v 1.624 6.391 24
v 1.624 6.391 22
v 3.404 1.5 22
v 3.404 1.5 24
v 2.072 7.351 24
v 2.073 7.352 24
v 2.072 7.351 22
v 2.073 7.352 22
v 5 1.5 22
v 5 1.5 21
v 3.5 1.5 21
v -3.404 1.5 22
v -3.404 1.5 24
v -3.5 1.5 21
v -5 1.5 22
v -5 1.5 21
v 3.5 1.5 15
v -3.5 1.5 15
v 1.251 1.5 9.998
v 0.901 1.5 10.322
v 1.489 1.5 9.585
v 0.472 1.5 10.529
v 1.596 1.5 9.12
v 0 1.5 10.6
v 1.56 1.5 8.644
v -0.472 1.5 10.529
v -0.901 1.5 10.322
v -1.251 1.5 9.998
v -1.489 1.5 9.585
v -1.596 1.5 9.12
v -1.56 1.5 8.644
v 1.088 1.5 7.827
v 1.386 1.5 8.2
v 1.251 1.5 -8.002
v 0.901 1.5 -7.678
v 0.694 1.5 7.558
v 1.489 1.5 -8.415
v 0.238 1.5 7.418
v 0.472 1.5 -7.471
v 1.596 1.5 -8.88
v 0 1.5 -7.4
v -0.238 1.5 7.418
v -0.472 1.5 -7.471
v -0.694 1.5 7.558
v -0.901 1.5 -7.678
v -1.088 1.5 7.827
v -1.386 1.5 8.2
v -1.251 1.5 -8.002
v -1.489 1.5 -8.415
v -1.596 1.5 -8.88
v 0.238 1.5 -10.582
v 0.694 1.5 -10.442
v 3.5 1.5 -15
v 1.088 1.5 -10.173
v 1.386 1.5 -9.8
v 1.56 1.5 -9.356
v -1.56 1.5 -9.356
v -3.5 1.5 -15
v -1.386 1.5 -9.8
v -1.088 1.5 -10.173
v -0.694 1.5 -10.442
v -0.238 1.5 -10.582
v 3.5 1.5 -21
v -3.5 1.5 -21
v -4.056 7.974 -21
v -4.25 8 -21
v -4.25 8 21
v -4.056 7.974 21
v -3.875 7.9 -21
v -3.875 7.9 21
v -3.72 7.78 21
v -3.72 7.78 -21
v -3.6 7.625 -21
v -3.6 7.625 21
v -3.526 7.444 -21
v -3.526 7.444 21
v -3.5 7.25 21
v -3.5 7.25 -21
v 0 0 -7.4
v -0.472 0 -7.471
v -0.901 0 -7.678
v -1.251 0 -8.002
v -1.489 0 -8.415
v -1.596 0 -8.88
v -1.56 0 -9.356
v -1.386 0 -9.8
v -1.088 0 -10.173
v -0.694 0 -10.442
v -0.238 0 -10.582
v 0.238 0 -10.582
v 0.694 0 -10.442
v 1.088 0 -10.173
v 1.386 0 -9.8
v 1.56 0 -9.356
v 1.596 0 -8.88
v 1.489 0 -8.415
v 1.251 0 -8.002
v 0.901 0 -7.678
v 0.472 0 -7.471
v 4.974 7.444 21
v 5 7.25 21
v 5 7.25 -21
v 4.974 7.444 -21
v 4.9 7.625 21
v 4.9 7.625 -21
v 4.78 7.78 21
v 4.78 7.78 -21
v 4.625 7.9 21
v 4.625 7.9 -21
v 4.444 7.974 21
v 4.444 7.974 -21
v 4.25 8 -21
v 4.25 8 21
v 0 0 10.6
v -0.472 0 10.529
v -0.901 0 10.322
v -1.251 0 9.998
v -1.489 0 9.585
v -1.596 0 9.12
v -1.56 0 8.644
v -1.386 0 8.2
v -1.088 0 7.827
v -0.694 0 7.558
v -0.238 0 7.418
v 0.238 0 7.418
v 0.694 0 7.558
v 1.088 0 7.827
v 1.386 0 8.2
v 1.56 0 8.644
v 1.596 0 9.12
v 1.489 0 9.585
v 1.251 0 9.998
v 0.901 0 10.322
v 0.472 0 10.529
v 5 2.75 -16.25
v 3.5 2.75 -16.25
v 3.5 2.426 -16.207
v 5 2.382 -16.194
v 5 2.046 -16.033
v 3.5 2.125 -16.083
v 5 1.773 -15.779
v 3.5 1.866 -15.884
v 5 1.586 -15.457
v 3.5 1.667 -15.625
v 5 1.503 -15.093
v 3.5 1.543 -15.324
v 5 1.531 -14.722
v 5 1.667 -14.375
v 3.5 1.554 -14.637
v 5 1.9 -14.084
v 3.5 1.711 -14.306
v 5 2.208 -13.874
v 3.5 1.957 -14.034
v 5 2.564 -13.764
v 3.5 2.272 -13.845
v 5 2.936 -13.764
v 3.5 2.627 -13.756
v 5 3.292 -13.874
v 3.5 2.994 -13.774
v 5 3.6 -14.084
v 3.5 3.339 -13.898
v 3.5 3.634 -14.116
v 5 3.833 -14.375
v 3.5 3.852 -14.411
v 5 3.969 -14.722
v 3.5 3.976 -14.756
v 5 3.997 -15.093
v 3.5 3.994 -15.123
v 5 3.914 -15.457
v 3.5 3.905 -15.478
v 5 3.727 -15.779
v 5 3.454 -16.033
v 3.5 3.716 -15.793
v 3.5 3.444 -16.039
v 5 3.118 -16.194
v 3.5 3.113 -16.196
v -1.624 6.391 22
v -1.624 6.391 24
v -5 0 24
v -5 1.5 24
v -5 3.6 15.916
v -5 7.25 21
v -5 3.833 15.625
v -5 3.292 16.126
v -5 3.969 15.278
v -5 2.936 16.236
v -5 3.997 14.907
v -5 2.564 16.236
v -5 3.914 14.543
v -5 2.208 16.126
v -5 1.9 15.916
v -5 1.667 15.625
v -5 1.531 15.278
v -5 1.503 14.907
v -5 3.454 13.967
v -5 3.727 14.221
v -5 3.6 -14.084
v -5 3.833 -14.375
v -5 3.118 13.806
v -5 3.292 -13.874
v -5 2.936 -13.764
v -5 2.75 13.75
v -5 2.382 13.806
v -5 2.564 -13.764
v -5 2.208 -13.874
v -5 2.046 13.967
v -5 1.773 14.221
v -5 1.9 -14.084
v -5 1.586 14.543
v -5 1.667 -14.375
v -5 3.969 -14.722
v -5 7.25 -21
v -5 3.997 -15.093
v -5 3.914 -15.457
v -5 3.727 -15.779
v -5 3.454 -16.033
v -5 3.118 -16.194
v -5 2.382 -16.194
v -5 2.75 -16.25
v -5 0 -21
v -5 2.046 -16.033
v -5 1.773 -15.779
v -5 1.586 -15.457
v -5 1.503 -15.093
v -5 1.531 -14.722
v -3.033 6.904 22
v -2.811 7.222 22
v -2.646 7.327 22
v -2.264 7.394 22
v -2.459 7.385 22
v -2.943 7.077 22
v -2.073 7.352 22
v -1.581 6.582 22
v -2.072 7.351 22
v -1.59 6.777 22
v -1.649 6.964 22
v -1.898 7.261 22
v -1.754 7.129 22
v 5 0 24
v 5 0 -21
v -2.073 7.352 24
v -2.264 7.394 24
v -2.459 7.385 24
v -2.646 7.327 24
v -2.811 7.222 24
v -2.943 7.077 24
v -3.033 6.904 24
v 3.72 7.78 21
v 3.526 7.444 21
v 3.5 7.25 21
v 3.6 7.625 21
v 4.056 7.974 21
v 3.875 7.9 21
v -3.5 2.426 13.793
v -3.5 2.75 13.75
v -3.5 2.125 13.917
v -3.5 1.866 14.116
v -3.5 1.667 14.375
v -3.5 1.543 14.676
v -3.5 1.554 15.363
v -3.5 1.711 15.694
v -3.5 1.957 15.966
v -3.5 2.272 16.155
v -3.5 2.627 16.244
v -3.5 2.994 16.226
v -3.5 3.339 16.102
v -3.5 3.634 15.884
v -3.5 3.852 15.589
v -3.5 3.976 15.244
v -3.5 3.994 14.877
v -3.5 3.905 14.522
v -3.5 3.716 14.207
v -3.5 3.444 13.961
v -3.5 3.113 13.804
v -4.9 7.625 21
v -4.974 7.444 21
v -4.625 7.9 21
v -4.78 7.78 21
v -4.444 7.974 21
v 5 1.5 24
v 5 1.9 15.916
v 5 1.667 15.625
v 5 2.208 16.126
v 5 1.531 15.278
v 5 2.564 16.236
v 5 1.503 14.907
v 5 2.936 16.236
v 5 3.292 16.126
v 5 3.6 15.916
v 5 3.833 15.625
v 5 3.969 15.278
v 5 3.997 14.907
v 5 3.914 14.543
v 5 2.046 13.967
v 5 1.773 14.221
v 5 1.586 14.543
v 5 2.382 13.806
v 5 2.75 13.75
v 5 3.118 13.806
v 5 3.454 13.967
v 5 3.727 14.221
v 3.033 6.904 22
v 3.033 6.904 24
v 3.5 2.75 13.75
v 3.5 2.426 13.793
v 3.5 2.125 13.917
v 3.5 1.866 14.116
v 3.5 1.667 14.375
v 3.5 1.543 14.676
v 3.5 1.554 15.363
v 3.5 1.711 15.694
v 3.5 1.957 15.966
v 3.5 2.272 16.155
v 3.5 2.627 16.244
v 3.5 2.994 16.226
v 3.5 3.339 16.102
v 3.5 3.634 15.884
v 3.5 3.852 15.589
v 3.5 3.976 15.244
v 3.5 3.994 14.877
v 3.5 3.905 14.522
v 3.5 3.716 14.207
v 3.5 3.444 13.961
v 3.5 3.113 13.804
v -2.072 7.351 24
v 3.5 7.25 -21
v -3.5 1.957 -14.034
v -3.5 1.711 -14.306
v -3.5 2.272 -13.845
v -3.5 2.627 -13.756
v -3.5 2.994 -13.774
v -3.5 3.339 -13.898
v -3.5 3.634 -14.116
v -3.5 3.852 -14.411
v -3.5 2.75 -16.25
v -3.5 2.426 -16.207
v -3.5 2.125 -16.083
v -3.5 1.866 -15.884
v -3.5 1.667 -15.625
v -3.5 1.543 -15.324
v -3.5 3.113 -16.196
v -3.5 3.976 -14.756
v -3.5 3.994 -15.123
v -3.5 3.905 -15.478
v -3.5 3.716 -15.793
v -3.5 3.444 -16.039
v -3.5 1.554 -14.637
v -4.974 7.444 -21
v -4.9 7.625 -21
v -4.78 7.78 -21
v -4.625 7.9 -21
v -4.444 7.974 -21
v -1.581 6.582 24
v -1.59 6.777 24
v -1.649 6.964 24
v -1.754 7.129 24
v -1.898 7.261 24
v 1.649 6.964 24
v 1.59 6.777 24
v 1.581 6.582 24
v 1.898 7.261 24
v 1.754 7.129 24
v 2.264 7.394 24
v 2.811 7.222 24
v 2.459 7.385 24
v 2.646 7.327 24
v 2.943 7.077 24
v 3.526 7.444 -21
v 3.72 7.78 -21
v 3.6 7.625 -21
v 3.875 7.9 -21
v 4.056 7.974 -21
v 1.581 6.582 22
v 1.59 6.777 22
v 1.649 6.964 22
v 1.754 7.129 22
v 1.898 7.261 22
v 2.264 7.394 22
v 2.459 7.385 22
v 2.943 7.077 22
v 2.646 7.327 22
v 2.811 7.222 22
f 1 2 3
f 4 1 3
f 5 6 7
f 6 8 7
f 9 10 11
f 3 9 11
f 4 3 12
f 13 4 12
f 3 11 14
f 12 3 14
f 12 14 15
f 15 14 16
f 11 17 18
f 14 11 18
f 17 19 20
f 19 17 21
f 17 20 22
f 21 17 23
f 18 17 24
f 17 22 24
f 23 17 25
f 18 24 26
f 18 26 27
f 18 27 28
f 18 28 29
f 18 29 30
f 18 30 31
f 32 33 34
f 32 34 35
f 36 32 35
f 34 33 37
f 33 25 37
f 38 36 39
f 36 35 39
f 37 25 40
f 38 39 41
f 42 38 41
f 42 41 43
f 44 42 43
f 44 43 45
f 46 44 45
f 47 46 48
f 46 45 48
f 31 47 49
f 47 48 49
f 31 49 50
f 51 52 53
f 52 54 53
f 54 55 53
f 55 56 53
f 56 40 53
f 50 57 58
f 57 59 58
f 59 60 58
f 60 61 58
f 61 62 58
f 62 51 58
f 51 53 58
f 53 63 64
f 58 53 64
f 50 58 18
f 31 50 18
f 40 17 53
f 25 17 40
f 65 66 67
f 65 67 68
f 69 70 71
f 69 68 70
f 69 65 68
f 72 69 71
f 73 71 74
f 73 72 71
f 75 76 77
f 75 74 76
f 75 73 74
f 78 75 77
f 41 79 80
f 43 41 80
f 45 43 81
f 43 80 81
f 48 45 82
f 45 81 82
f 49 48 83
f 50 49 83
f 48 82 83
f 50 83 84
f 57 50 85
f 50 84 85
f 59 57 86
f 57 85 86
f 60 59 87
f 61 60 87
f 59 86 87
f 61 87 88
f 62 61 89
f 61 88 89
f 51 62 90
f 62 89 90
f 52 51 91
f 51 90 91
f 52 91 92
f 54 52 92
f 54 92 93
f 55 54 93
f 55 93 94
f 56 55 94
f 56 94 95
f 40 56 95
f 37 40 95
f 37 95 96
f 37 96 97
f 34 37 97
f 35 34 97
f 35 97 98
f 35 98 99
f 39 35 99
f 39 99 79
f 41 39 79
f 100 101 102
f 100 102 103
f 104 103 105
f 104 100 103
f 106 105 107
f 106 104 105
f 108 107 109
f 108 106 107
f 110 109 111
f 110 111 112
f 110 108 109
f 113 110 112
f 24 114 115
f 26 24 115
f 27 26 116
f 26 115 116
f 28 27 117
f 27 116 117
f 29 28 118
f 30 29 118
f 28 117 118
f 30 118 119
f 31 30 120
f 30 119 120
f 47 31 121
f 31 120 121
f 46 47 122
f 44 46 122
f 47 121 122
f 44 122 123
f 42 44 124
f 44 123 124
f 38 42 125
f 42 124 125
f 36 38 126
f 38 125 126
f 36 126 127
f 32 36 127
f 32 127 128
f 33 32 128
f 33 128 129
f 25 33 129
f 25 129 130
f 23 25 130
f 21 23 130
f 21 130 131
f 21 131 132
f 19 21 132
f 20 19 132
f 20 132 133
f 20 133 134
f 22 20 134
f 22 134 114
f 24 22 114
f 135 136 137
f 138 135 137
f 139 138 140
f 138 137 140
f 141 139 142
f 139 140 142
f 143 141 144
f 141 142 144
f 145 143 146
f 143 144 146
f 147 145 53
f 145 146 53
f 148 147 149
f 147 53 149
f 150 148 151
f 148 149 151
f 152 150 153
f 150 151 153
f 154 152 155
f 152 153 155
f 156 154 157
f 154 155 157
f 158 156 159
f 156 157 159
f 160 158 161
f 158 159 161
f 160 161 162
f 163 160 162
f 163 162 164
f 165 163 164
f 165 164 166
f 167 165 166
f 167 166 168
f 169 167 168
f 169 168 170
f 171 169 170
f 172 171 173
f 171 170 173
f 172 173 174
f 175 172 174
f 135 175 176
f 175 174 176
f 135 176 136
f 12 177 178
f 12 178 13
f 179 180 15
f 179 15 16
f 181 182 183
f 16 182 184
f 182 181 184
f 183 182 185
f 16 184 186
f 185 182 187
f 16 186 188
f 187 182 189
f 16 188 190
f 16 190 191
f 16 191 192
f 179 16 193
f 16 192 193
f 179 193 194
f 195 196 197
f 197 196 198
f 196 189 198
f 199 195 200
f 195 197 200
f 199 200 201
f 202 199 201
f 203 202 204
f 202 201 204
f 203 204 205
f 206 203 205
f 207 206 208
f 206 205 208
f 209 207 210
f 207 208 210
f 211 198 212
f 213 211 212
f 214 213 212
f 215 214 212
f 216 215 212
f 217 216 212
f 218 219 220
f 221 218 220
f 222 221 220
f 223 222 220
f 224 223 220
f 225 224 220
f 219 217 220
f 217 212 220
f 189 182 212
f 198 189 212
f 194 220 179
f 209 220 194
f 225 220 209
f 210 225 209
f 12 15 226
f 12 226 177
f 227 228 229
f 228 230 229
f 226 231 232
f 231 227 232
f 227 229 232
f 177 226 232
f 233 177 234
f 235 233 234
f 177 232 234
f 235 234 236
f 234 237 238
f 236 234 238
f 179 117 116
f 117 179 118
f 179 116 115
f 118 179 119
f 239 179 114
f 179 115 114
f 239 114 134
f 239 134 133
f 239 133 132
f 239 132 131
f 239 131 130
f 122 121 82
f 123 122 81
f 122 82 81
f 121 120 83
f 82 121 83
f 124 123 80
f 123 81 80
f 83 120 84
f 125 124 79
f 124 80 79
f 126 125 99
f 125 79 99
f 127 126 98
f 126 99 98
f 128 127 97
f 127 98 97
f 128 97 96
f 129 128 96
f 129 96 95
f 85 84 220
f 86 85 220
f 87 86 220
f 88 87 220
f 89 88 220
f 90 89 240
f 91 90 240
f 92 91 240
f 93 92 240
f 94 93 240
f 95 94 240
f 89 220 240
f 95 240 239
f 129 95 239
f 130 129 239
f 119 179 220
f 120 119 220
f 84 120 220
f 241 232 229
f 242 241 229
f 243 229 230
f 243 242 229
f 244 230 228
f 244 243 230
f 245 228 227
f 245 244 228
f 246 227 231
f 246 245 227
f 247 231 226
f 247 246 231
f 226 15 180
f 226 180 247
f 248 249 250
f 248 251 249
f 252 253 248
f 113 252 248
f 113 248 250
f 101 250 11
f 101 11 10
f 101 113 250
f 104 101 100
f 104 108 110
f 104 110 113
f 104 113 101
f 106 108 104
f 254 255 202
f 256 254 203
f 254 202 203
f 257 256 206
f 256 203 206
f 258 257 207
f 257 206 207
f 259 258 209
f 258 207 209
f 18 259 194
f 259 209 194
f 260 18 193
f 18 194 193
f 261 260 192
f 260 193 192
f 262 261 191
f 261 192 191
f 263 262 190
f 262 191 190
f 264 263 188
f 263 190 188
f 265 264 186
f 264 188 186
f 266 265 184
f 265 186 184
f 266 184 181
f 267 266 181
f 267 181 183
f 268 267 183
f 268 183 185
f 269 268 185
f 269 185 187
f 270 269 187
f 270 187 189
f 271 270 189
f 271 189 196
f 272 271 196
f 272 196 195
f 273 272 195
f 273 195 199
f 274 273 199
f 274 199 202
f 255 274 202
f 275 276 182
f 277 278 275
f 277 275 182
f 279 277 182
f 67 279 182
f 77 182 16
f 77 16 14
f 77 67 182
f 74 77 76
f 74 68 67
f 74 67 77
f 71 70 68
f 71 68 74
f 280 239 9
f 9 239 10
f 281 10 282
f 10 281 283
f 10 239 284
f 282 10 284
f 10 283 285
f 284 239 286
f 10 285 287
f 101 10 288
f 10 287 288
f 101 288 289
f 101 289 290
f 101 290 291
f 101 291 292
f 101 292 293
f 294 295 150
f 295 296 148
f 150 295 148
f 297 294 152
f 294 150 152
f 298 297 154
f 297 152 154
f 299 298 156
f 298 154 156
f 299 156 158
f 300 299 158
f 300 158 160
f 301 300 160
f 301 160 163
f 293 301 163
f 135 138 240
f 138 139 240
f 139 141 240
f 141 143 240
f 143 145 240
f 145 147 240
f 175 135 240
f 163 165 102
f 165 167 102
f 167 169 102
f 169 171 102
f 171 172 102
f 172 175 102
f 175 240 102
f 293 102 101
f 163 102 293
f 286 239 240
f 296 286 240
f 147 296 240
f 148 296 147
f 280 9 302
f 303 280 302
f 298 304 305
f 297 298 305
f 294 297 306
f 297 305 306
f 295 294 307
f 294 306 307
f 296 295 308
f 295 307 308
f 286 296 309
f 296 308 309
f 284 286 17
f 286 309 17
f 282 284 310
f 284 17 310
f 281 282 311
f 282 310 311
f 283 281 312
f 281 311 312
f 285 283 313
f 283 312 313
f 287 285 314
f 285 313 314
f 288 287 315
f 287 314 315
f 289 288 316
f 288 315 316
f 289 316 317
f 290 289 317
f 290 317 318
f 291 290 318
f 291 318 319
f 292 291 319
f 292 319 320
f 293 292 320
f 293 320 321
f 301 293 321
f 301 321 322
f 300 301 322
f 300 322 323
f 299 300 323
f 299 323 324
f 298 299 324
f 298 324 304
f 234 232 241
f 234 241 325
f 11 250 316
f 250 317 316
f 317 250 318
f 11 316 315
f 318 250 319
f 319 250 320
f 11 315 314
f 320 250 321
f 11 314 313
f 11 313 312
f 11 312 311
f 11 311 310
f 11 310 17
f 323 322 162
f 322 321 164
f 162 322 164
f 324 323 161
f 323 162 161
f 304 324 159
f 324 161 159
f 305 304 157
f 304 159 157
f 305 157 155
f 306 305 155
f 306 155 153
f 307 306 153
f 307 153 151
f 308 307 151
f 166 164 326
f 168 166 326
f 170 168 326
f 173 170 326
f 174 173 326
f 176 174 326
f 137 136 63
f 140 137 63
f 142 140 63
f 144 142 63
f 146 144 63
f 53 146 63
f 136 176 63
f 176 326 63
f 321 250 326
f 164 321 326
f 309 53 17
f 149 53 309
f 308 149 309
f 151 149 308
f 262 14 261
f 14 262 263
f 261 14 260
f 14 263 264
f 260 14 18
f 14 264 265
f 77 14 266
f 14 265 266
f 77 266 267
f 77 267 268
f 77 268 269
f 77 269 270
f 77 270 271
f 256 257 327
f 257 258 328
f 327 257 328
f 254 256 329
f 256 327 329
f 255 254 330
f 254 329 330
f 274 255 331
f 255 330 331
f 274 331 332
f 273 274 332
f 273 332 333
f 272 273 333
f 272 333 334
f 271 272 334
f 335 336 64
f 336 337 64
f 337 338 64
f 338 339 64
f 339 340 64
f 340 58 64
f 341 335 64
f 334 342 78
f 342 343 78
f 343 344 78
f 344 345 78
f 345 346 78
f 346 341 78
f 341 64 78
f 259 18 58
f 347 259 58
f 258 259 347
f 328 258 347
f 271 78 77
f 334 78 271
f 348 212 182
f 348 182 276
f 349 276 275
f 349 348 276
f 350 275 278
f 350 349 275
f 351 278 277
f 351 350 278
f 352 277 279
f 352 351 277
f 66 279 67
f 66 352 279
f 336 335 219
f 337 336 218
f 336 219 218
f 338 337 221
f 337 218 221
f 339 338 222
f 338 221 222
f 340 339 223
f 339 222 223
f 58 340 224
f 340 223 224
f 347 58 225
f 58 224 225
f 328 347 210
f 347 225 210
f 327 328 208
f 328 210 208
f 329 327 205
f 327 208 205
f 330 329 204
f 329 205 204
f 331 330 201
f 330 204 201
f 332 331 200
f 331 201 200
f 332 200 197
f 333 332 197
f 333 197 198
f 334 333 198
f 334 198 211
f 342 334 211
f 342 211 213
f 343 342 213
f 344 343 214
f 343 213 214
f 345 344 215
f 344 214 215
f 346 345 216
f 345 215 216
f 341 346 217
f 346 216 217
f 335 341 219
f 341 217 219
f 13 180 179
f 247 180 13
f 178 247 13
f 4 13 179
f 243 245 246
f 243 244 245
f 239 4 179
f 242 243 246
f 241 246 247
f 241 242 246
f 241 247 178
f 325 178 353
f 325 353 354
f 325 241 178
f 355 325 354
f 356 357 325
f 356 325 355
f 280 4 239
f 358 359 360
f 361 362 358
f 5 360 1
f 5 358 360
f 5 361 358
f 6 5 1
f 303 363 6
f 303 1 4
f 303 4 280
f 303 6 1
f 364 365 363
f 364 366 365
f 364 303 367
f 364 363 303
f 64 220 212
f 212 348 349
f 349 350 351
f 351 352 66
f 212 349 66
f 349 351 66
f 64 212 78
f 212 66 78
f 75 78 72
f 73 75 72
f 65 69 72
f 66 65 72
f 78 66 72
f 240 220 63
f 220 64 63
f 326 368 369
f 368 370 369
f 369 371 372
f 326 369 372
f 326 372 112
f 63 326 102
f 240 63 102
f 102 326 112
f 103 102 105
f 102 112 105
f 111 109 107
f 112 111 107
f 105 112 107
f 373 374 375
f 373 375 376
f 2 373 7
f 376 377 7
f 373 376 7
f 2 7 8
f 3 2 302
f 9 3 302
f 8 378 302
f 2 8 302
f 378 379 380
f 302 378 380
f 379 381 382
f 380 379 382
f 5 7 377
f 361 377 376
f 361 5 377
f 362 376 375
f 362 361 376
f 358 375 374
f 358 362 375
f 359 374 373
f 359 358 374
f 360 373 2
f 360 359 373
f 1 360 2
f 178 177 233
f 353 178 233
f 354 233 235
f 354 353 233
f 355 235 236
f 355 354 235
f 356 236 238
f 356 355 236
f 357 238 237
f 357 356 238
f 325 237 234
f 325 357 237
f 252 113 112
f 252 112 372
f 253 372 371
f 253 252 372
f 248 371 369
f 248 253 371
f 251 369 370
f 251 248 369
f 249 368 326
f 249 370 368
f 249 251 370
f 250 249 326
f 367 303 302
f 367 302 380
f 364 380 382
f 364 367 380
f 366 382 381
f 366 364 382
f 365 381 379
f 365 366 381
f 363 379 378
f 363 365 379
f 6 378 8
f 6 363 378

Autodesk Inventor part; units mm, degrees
ref_plane "YZ Plane" through (0, 0, 0) normal (1, 0, 0) x (0, 1, 0)
ref_plane "XZ Plane" through (0, 0, 0) normal (0, 1, 0) x (-1, 0, 0)
ref_plane "XY Plane" through (0, 0, 0) normal (0, 0, 1) x (1, 0, 0)
sketch "Náčrt1" plane through (0, 0, 0) normal (0, 0, 1) x (1, 0, 0)
  line L0 (-7, 0) -> (7, 0) projected
  line L1 (0, 9.6) -> (0, -1.6) projected
  line L2 (-5, 8) -> (-5, 0)
  line L3 (-5, 0) -> (5, 0)
  line L4 (5, 0) -> (5, 8)
  line L5 (5, 8) -> (3.5, 8)
  line L6 (3.5, 8) -> (3.5, 1.5)
  line L7 (3.5, 1.5) -> (-3.5, 1.5)
  line L8 (-3.5, 1.5) -> (-3.5, 8)
  line L9 (-3.5, 8) -> (-5, 8)
  point P0 (0, 0)
  point P1 (-5, 0)
  dimension "d0" = 1.5
  dimension "d1" = 1.5
  dimension "d2" = 1.5
  dimension "d3" = 10
  dimension "d4" = 8
  dimension "d5" = 8
extrude "Vysunutí1" add sketch "Náčrt1" along normal mid plane 42
sketch "Náčrt2" plane through (0, 0, 21) normal (0, 0, 1) x (1, 0, 0)
  line L0 (-5, 8) -> (-5, 0) projected
  line L1 (-5, 0) -> (5, 0) projected
  line L2 (5, 0) -> (5, 8) projected
  line L3 (5, 8) -> (3.5, 8) projected
  line L4 (3.5, 8) -> (3.5, 1.5) projected
  line L5 (3.5, 1.5) -> (-3.5, 1.5) projected
  line L6 (-3.5, 1.5) -> (-3.5, 8) projected
  line L7 (-3.5, 8) -> (-5, 8) projected
  line L8 (-5, 0) -> (5, 0)
  line L9 (5, 0) -> (5, 1.5)
  line L10 (5, 1.5) -> (-5, 1.5)
  line L11 (-5, 1.5) -> (-5, 0)
  point P0 (0, 0)
extrude "Vysunutí2" add sketch "Náčrt2" along normal blind 1 contours L10 L5 L2 L1 L0
sketch "Náčrt3" plane through (0, 0, 22) normal (0, 0, 1) x (1, 0, 0)
  line L0 (-5, 1.5) -> (-5, 0) projected
  line L1 (-5, 0) -> (5, 0) projected
  line L2 (5, 0) -> (5, 1.5) projected
  line L3 (5, 1.5) -> (-5, 1.5) projected
  line L4 (5, 1.5) -> (5, 0)
  line L5 (5, 0) -> (-5, 0) projected
  line L6 (5, 0) -> (-5, 0)
  line L7 (-5, 0) -> (-5, 1.5)
  line L8 (-5, 1.5) -> (-2.7769, 7.608)
  line L9 (-5, 1.5) -> (1.5, 1.5) construction
  line L10 (-2.7769, 7.608) -> (-1.3673, 7.095)
  line L11 (-1.3673, 7.095) -> (-3.4037, 1.5)
  line L12 (0, 9.6) -> (0, -1.6) projected
  line L13 (5, 1.5) -> (2.7769, 7.608)
  line L14 (2.7769, 7.608) -> (1.3673, 7.095)
  line L15 (1.3673, 7.095) -> (3.4037, 1.5)
  line L16 (-3.4037, 1.5) -> (3.4037, 1.5)
  point P0 (0, 0)
  dimension "d10" = 6.5
  dimension "d11" = 70
  dimension "d12" = 1.5
extrude "Vysunutí3" add sketch "Náčrt3" along normal blind 2
fillet "Zaoblení1" radius 0.75 8 edges at (-5, 8, 0) (-3.5, 8, 0) (3.5, 8, 0) (5, 8, 0) (1.3673, 7.095, 23) (2.7769, 7.608, 23) (-2.7769, 7.608, 23) (-1.3673, 7.095, 23)
sketch "Náčrt4" plane through (5, 0, 24) normal (1, 0, 0) x (0, 0, -1)
  line L0 (3, 7.25) -> (45, 7.25) projected
  line L1 (3, 1.5) -> (3, 7.25) projected
  line L2 (3, 1.5) -> (2, 1.5) projected
  line L3 (2, 1.5) -> (0, 1.5) projected
  line L4 (0, 0) -> (0, 1.5) projected
  line L5 (45, 0) -> (0, 0) projected
  line L6 (45, 7.25) -> (45, 0) projected
  point P0 (24, 0)
  point P1 (9, 2.75)
  point P2 (39, 2.75)
  dimension "d16" = 2.75
  dimension "d17" = 2.75
  dimension "d18" = 6
  dimension "d19" = 30
hole "Díra1" at (5, 2.75, 15) at (5, 2.75, -15) direction (-1, 0, 0) diameter 2.5 end through all
sketch "Náčrt5" plane through (-3.5, 1.5, -21) normal (0, 1, 0) x (1, 0, 0)
  line L0 (7, 0) -> (7, -6) projected
  line L1 (0, 0) -> (7, 0) projected
  line L2 (0, 0) -> (0, -6) projected
  line L3 (0, -6) -> (0, -36) projected
  line L4 (0, -36) -> (0, -42) projected
  line L5 (-1.5, -42) -> (0, -42) projected
  line L6 (-1.5, -42) -> (-1.5, -43) projected
  line L7 (0.0963, -43) -> (-1.5, -43) projected
  line L8 (0.0963, -43) -> (0.0963, -45) projected
  line L9 (6.9037, -45) -> (0.0963, -45) projected
  line L10 (6.9037, -43) -> (6.9037, -45) projected
  line L11 (8.5, -43) -> (6.9037, -43) projected
  line L12 (8.5, -42) -> (8.5, -43) projected
  line L13 (7, -42) -> (8.5, -42) projected
  line L14 (7, -36) -> (7, -42) projected
  line L15 (7, -6) -> (7, -36) projected
  line L16 (10.5, -21) -> (-3.5, -21) projected
  line L17 (3.5, 9) -> (3.5, -54) projected
  point P0 (3.5, -21)
  point P1 (3.5, -12)
  point P2 (3.5, -30)
  dimension "d27" = 12
  dimension "d28" = 18
hole "Díra2" at (0, 1.5, -9) at (0, 1.5, 9) direction (0, -1, 0) diameter 3.2 end through all
properties part number "x_holder" material "Hliník 6061"
